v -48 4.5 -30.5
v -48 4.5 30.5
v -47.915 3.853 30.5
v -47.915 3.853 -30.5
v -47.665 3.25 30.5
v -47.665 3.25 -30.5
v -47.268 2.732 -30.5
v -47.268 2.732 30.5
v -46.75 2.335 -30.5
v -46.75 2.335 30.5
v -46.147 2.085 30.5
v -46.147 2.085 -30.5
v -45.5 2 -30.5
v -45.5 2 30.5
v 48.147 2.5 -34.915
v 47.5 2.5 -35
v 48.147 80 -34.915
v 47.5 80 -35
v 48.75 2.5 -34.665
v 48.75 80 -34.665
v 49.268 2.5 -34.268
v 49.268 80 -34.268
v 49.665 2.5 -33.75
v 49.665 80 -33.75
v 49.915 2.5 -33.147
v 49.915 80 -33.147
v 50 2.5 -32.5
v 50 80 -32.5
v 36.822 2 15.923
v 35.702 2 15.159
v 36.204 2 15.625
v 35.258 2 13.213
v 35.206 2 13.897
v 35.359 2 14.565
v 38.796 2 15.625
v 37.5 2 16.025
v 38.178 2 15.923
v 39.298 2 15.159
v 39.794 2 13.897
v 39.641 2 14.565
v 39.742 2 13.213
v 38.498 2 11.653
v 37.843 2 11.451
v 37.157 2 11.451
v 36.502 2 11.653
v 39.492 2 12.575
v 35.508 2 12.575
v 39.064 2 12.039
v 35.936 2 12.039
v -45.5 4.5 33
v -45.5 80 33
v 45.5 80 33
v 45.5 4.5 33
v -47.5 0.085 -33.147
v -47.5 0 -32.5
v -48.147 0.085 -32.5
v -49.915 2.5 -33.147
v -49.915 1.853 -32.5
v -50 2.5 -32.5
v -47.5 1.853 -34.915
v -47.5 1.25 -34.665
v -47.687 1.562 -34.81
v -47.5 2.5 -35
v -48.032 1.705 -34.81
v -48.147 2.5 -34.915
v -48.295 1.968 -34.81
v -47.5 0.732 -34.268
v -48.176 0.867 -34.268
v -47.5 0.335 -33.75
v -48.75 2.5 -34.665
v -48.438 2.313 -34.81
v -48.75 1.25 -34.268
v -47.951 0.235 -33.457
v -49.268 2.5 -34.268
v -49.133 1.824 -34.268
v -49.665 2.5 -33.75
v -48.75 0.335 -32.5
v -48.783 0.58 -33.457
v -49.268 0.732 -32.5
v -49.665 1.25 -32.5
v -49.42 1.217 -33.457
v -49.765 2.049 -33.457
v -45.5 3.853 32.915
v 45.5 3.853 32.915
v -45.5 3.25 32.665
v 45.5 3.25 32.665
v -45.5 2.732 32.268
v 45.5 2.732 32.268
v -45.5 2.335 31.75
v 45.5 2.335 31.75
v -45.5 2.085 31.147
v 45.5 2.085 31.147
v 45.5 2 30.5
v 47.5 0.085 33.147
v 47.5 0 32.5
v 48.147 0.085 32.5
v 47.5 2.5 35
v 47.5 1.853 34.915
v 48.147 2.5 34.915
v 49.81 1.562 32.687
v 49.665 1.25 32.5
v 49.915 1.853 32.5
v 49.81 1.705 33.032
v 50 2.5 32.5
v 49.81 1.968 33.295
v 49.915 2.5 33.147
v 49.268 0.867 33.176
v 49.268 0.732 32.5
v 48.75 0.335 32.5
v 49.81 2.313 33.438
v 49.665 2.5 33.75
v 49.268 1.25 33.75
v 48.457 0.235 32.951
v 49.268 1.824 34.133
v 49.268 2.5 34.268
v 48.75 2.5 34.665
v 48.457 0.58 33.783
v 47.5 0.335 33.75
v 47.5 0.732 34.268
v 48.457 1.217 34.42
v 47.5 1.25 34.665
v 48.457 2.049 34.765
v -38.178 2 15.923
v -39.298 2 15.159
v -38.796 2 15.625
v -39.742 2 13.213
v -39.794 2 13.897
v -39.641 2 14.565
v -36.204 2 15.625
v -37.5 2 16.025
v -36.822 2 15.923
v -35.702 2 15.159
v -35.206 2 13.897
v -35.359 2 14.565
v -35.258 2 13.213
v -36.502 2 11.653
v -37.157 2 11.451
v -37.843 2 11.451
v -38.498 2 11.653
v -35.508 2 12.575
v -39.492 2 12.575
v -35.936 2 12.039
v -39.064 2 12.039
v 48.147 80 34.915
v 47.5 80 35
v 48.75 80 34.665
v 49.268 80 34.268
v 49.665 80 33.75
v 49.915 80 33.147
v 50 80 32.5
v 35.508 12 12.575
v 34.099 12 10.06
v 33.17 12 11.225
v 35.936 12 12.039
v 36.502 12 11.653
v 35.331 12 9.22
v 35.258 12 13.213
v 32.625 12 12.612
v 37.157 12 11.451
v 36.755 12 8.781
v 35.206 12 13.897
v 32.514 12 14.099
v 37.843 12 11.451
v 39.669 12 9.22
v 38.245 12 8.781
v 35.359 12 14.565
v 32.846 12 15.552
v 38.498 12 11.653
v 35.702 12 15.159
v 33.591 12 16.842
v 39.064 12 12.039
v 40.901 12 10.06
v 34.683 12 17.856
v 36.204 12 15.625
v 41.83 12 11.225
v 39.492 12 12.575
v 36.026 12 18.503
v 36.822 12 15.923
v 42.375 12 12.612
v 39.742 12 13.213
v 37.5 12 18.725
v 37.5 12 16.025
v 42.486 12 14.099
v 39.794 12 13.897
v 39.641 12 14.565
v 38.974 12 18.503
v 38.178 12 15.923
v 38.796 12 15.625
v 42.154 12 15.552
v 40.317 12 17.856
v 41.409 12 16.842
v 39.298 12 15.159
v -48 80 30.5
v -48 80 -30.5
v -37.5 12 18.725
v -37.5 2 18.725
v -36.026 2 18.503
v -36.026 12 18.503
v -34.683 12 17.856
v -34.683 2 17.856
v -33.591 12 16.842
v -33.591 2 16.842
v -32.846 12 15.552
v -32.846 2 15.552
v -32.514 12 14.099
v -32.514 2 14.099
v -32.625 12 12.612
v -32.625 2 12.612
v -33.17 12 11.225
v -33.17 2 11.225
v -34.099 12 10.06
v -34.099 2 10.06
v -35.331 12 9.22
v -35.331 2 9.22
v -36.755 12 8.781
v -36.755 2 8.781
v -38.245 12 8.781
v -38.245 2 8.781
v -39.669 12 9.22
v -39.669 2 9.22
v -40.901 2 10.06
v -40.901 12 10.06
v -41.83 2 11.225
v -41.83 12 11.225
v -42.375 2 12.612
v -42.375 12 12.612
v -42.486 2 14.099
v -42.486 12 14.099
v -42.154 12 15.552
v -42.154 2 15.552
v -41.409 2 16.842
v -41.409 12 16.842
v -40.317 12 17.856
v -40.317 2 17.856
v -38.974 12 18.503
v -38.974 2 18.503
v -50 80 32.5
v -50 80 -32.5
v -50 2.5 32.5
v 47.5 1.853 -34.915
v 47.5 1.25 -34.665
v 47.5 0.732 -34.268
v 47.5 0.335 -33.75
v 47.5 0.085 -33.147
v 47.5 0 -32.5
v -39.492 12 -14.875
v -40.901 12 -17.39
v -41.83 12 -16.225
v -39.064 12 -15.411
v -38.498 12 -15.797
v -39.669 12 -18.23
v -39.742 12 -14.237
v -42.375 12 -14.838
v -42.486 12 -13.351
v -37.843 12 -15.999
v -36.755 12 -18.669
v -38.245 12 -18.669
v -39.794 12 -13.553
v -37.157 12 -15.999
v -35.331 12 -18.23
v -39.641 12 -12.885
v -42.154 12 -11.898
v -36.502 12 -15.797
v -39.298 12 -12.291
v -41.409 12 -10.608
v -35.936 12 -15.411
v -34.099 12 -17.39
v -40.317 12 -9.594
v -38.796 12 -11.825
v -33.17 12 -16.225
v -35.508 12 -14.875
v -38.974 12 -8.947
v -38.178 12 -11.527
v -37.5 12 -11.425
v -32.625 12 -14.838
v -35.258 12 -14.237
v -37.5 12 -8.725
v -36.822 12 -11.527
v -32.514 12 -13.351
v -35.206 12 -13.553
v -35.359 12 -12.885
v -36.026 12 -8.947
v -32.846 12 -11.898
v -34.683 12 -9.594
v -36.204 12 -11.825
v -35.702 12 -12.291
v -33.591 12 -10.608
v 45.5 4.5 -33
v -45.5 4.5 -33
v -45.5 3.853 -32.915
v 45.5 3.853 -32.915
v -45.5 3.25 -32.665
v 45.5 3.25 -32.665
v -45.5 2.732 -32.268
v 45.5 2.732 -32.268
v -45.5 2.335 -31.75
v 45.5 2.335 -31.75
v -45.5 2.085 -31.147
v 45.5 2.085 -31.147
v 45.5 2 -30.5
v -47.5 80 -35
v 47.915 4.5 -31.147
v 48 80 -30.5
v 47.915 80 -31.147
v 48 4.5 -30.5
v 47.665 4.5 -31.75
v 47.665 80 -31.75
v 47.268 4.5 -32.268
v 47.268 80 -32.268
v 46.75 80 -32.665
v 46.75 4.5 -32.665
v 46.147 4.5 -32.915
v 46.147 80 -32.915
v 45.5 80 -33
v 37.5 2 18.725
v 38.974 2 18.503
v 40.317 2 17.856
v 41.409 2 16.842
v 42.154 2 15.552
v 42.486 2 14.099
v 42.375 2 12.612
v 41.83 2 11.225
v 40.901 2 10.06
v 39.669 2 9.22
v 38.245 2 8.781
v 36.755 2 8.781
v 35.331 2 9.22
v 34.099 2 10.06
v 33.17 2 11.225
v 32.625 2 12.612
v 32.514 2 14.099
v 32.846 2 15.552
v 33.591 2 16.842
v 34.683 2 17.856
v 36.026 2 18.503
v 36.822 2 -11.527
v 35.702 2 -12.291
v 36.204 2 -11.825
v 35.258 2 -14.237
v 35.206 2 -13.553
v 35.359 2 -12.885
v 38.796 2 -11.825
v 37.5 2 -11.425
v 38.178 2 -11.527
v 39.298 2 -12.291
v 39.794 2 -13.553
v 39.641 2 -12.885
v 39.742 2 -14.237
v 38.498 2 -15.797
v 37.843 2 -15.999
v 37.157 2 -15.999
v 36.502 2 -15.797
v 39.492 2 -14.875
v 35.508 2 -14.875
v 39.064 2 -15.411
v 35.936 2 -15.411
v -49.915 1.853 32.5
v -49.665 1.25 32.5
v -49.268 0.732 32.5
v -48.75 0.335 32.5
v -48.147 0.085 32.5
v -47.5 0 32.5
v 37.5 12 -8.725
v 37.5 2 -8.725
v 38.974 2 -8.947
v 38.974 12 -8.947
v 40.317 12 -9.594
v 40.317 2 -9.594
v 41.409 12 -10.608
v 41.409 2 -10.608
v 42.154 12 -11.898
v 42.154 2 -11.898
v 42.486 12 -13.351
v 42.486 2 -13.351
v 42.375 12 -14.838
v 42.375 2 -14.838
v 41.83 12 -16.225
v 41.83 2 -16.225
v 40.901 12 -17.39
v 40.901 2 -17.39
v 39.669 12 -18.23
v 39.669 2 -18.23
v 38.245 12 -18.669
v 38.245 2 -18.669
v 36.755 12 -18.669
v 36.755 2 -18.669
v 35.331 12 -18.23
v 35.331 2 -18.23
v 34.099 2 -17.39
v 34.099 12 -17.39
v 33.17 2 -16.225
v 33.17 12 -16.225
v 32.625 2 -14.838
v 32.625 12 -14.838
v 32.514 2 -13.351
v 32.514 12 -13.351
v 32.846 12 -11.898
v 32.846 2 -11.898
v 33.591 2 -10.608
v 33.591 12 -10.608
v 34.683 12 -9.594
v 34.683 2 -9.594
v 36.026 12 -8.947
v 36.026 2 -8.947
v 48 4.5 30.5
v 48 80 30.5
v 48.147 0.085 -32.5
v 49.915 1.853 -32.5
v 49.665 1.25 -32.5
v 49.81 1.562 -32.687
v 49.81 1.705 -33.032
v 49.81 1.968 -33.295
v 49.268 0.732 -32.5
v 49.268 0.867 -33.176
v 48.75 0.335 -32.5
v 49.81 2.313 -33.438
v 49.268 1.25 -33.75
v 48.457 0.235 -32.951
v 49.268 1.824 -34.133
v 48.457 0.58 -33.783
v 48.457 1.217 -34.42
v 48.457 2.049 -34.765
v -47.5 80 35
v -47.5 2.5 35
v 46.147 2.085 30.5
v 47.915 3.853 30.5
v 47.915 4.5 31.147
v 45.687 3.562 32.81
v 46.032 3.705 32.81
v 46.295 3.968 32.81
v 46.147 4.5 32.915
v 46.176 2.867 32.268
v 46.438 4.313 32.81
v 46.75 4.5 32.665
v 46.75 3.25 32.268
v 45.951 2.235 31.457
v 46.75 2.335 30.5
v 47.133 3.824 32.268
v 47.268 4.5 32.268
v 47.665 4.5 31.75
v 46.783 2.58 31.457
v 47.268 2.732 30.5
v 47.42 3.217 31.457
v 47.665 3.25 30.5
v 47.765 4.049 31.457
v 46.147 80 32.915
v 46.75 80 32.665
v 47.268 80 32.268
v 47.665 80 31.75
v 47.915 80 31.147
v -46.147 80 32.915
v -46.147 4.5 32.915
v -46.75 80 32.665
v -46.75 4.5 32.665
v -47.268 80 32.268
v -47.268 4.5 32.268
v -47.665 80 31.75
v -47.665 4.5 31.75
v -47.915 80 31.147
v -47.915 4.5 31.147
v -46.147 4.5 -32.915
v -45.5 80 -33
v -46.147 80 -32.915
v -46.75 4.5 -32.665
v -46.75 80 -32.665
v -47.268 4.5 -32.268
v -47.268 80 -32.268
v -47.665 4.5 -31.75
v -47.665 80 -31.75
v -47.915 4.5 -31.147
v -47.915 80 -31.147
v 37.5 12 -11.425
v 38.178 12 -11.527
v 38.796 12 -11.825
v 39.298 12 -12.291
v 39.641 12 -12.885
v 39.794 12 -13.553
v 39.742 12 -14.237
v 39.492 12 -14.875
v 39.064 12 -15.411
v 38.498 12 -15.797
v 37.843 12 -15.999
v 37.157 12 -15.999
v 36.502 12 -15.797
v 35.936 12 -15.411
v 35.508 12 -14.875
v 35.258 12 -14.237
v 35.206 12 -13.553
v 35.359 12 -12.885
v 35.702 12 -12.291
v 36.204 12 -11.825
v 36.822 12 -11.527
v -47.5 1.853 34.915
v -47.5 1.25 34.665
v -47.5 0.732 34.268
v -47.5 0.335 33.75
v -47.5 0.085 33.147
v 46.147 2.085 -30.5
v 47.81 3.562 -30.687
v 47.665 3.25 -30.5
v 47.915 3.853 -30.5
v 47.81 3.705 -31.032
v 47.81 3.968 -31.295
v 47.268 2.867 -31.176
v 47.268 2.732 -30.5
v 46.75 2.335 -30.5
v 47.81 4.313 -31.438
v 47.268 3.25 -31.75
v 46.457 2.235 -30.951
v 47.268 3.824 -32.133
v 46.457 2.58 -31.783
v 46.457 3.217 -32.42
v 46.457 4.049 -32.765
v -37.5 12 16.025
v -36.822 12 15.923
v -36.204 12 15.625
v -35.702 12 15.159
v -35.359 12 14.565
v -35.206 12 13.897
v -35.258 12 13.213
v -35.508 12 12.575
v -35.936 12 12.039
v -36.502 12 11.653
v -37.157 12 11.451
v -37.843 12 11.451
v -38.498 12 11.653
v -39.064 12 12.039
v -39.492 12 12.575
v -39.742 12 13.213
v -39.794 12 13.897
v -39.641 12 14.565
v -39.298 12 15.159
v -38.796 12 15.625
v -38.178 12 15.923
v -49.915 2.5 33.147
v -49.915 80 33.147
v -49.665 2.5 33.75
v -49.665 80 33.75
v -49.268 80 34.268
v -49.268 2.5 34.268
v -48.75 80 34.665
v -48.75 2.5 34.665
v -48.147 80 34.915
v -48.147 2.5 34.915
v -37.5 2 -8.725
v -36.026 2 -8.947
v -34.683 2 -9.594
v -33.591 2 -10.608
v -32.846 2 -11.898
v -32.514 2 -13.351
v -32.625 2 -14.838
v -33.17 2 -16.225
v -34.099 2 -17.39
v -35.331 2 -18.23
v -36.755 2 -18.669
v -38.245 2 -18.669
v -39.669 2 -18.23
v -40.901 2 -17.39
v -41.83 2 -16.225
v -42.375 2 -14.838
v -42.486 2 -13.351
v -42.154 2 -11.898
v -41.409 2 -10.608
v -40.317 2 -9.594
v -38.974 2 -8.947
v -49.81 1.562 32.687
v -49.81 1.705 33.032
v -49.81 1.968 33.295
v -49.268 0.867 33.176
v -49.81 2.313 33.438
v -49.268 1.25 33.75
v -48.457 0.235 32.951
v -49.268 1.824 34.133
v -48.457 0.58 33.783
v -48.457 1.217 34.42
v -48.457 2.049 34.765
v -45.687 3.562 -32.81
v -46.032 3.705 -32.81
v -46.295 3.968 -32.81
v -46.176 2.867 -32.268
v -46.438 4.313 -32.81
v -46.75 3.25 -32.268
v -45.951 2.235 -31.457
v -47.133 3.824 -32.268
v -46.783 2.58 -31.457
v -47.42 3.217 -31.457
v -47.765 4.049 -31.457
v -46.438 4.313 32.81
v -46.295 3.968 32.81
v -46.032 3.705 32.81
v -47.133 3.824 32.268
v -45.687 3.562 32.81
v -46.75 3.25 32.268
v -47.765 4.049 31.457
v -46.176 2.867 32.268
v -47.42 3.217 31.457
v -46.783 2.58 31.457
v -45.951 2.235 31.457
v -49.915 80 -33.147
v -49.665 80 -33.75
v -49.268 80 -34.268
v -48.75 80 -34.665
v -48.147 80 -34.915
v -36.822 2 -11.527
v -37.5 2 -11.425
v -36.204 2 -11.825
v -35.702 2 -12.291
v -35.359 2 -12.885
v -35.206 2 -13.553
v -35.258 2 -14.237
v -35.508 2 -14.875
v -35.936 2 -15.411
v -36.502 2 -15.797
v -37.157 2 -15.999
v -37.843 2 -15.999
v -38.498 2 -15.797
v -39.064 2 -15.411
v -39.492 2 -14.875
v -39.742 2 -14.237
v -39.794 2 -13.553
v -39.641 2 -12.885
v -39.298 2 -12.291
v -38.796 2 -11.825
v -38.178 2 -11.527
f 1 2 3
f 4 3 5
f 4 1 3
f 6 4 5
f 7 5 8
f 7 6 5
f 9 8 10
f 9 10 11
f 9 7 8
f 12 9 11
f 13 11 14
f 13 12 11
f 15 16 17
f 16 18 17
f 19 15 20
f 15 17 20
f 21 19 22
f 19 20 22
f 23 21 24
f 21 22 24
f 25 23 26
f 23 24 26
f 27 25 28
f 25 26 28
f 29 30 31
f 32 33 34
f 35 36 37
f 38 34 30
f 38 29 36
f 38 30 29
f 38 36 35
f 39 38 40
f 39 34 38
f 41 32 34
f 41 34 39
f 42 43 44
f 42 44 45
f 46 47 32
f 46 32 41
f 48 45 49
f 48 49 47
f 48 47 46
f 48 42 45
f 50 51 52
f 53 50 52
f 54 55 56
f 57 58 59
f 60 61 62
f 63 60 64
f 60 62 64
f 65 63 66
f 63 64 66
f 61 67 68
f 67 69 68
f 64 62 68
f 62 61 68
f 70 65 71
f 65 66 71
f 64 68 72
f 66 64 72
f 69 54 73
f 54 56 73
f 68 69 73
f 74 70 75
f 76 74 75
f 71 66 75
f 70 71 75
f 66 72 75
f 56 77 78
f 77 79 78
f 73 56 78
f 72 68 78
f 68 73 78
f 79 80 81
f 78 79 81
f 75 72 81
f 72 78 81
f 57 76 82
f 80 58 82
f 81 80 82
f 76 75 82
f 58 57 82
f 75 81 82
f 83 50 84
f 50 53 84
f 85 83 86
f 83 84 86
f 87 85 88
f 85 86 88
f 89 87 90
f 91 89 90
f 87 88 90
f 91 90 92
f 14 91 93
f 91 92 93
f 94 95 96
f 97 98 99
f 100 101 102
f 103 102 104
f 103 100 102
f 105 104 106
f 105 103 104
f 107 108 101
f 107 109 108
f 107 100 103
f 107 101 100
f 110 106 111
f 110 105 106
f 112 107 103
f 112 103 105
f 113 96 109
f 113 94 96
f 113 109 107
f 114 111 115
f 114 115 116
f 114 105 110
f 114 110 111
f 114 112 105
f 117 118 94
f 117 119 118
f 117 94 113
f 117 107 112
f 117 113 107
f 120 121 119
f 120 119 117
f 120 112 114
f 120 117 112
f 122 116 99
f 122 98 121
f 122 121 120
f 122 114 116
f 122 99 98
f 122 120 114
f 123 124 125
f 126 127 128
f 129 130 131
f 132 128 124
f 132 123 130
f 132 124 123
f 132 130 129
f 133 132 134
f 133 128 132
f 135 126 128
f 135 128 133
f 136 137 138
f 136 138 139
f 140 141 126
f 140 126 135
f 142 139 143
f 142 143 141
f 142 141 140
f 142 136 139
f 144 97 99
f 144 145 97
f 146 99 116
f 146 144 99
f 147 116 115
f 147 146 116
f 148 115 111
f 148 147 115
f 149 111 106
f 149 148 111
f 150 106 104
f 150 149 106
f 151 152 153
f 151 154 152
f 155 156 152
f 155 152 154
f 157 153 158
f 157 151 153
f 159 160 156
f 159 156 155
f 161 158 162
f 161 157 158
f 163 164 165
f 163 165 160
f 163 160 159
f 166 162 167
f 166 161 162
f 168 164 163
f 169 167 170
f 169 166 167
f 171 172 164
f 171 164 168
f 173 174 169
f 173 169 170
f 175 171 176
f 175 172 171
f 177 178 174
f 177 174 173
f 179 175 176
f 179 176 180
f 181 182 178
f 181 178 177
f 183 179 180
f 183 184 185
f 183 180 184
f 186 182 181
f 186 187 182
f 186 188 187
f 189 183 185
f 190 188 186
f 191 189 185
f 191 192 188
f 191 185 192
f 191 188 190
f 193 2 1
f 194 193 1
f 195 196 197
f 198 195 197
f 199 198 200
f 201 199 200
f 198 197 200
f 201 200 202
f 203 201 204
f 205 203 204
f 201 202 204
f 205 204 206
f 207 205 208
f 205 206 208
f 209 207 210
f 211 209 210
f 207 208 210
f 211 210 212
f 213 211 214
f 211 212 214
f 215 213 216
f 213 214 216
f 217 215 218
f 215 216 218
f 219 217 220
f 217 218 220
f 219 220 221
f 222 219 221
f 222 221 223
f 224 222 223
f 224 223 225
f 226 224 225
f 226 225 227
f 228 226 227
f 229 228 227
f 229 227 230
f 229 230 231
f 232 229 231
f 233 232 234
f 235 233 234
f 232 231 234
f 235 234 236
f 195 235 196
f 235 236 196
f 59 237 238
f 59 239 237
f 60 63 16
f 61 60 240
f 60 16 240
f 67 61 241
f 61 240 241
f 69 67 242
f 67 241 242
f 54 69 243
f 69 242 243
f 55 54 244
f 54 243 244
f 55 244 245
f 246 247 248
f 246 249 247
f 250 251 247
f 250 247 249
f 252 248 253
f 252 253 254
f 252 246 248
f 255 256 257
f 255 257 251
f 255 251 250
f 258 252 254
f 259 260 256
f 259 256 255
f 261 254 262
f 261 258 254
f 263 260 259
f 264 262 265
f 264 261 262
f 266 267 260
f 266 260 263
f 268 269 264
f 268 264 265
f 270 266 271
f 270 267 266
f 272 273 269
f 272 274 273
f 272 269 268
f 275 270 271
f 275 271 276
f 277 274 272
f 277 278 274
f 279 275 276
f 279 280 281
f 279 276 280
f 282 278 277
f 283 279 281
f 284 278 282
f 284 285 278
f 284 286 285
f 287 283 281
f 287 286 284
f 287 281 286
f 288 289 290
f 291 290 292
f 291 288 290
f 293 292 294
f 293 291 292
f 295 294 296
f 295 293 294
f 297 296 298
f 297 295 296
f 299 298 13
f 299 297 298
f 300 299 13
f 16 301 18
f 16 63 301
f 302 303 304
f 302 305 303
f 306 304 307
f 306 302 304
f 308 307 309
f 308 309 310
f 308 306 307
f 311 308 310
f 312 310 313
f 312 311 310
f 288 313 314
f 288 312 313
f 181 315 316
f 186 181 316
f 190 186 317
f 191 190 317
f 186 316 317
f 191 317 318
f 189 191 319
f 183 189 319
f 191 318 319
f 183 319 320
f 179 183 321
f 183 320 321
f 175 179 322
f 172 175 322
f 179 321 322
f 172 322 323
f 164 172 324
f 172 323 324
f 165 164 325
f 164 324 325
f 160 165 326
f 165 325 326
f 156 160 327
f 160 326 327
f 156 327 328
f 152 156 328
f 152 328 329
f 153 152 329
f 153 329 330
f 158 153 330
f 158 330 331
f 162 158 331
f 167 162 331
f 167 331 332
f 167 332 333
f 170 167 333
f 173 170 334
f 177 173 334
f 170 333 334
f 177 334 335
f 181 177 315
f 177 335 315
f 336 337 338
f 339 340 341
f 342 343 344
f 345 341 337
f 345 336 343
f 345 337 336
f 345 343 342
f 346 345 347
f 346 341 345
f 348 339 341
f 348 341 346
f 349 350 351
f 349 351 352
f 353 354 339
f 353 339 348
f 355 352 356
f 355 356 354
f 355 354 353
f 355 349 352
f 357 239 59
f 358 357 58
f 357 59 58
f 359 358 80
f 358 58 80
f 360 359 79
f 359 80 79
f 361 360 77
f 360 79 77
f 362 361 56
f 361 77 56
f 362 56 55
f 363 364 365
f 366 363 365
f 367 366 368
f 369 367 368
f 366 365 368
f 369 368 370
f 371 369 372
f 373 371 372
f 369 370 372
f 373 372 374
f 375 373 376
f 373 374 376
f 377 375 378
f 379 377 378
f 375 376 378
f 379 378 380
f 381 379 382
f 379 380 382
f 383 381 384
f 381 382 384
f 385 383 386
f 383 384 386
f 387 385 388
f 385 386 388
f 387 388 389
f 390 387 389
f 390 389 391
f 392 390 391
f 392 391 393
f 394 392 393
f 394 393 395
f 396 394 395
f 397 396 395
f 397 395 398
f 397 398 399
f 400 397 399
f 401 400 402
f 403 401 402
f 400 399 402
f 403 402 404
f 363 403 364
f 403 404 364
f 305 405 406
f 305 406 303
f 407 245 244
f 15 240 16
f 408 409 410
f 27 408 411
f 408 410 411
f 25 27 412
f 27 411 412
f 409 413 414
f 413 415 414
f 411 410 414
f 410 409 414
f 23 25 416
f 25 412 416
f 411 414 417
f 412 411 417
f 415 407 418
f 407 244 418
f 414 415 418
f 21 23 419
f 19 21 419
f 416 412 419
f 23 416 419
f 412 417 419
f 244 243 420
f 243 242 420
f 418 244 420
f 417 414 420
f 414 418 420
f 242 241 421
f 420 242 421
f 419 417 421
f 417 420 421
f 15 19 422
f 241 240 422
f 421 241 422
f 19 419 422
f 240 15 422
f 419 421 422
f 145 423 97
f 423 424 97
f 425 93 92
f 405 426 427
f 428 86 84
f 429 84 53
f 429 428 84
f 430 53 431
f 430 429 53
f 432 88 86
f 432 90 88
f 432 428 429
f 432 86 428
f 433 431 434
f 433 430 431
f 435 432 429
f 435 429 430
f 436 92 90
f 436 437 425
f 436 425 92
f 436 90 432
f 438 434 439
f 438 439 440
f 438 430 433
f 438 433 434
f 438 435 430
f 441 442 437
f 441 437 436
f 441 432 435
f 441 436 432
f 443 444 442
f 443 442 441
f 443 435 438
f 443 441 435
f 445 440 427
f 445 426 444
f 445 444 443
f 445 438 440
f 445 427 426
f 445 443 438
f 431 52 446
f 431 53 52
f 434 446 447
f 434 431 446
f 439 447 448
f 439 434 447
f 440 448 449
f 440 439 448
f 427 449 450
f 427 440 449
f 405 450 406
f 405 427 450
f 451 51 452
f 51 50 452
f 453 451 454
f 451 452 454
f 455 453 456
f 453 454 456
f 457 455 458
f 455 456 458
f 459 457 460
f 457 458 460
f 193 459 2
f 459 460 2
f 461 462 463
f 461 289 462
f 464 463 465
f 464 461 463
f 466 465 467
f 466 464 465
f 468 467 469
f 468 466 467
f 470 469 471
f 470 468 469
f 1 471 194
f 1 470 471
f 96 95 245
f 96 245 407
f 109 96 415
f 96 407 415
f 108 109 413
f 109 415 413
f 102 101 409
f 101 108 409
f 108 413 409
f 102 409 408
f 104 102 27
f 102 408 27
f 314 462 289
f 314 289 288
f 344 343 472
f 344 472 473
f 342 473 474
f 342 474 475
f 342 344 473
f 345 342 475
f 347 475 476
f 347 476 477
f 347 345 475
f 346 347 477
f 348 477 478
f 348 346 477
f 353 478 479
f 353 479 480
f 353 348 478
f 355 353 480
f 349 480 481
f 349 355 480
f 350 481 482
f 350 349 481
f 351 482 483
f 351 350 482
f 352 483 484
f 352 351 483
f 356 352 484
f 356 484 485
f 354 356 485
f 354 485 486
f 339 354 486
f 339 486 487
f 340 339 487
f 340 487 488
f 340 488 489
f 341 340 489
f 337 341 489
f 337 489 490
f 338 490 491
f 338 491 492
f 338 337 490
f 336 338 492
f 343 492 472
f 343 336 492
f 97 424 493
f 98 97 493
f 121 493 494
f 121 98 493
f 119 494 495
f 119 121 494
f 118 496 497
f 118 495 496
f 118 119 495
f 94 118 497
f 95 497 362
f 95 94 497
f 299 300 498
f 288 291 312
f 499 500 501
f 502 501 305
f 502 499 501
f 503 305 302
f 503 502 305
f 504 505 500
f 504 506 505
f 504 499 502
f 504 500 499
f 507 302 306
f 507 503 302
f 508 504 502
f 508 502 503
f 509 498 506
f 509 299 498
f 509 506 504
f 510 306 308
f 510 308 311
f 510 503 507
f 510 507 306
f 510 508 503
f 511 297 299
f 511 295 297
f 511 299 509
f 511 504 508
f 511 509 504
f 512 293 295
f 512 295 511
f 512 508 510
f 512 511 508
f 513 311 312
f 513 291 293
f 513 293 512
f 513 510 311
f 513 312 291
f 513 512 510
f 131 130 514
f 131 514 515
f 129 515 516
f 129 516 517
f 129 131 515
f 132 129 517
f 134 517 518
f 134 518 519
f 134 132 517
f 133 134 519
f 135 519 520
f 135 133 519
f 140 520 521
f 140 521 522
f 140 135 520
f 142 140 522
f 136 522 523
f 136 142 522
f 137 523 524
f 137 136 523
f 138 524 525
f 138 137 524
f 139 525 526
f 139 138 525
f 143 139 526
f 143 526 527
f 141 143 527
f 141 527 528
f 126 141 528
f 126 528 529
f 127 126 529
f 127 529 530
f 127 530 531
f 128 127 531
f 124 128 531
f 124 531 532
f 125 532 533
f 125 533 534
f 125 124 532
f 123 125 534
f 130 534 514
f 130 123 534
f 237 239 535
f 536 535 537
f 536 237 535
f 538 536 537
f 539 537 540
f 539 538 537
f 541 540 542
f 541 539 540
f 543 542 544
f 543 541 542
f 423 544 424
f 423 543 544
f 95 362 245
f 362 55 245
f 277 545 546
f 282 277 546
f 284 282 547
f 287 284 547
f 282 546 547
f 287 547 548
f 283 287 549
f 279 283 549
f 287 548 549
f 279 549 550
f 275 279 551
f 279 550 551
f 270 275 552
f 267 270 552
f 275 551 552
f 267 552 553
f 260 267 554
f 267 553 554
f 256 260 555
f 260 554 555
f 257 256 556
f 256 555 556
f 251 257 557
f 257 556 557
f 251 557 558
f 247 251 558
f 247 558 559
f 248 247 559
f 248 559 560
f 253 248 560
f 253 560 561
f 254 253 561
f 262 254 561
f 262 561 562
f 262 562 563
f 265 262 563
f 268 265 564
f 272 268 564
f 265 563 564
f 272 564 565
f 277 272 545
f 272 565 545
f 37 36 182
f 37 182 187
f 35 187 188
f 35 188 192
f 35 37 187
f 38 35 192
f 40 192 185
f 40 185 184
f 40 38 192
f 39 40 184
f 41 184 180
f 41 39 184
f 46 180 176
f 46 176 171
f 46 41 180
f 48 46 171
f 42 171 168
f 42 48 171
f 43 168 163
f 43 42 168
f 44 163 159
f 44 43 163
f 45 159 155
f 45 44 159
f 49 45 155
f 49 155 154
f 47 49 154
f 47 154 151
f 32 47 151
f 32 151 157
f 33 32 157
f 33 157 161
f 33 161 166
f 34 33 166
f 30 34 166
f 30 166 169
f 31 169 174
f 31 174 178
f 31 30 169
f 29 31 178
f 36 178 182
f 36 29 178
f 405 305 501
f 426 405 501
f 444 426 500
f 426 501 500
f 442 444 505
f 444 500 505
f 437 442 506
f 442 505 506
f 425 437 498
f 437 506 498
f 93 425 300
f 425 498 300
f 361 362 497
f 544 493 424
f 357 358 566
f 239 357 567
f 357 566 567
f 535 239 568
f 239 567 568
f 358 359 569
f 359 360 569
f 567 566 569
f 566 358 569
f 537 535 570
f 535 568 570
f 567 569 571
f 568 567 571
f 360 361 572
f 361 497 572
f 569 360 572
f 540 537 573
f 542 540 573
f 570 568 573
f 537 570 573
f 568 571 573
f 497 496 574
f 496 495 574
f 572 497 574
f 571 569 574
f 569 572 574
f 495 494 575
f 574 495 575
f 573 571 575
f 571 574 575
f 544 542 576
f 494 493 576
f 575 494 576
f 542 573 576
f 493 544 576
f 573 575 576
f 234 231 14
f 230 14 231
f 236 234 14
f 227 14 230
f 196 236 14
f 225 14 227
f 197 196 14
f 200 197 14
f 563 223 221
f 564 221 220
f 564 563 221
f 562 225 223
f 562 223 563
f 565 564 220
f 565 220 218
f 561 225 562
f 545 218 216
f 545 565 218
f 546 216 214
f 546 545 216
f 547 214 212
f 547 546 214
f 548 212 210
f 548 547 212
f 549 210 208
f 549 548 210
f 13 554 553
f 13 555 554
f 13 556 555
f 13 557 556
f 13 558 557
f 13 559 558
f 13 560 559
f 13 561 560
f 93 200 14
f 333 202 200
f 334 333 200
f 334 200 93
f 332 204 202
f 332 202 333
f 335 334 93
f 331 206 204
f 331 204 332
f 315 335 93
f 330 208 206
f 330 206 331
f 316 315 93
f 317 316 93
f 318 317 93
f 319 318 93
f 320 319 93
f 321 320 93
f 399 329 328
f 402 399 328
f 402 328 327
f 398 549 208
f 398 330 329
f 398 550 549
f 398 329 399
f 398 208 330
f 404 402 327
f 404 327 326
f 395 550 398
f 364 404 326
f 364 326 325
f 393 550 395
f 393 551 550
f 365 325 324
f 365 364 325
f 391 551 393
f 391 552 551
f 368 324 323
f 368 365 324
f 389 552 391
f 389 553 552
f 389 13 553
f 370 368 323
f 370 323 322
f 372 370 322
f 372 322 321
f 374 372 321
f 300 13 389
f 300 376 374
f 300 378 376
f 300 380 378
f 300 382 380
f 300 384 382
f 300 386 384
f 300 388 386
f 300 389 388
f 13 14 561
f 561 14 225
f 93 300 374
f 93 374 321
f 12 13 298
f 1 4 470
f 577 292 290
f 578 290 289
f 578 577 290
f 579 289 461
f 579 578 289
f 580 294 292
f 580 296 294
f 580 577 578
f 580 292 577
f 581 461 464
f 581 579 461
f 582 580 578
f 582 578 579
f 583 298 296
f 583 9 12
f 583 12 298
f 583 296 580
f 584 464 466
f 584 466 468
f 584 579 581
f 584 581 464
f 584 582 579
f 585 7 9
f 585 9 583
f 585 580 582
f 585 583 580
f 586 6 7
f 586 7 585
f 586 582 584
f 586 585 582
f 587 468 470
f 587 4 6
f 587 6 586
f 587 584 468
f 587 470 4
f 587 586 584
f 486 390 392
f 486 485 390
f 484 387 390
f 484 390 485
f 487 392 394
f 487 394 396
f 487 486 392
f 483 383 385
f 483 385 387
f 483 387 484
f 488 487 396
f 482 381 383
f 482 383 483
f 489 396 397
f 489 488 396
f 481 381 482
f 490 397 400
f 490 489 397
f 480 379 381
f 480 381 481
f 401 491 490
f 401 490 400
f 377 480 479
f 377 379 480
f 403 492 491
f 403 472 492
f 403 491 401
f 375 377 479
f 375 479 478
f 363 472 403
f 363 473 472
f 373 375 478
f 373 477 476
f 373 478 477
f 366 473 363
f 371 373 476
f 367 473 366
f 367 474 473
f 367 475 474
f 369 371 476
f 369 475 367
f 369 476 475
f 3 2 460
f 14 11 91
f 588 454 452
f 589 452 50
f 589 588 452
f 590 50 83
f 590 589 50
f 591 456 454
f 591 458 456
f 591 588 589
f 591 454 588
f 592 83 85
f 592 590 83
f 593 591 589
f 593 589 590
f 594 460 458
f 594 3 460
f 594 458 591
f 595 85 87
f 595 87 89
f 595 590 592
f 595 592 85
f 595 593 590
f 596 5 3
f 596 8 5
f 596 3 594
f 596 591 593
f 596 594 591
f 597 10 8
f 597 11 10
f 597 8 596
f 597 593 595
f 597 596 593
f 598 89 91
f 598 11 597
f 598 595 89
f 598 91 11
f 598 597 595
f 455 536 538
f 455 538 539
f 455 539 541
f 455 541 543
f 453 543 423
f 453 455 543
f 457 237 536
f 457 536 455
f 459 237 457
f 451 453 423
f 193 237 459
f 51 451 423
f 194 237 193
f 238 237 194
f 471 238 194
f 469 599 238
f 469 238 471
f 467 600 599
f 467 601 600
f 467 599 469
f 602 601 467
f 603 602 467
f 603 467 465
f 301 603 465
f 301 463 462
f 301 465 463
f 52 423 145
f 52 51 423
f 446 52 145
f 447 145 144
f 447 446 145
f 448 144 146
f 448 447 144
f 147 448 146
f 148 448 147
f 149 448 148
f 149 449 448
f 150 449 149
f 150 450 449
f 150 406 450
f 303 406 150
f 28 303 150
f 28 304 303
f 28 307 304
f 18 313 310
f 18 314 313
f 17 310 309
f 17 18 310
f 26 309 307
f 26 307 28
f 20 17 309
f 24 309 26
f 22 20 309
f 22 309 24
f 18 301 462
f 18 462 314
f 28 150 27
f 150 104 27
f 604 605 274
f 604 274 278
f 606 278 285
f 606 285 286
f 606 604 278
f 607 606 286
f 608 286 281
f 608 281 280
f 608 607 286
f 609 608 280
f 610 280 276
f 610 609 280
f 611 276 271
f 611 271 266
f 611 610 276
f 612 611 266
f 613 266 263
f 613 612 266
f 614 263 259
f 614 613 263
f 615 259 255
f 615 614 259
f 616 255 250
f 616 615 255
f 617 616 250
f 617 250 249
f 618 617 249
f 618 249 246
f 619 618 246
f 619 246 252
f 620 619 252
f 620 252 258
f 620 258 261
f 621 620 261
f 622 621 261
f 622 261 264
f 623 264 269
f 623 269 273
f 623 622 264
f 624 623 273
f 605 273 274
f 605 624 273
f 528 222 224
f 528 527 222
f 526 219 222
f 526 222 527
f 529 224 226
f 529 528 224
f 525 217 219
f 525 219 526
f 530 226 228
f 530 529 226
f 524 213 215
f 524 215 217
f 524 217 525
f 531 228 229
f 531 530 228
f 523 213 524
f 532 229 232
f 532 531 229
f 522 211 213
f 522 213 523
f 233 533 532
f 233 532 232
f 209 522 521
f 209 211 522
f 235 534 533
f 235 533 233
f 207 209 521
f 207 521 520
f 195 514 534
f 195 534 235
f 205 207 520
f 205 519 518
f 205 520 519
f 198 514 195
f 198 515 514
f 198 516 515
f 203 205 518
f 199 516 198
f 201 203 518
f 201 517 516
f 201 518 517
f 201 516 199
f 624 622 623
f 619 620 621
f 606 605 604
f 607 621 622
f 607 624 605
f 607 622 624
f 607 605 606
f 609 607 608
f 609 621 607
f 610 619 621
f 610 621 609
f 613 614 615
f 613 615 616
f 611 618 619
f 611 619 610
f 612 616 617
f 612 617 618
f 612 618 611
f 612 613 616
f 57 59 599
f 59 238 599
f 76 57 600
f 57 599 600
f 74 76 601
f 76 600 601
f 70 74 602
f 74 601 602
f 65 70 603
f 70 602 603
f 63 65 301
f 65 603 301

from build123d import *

# Parameters (mm, degrees)
SKETCH_2_W          = 100
SKETCH_2_H          = 70
EXTRUDE_1_DEPTH     = 80
SKETCH_4_W          = 96
SKETCH_4_H          = 66
CUT_EXTRUDE_1_DEPTH = 78
FILLET_2_R          = 2.5
SKETCH_6_R          = 5
SKETCH_6_R_2        = 2.3
EXTRUDE_3_DEPTH     = 10


with BuildPart() as part:
    # Эскиз2 → Бобышка-Вытянуть1 (new body)
    with BuildSketch(Plane(origin=(0, 0, 0), x_dir=(1, 0, 0), z_dir=(0, 1, 0))):
        Rectangle(SKETCH_2_W, SKETCH_2_H)
    extrude(amount=EXTRUDE_1_DEPTH)

    # Эскиз4 → Вырез-Вытянуть1 (cut)
    with BuildSketch(Plane(origin=(0, 80, 0), x_dir=(1, 0, 0), z_dir=(0, 1, 0))):
        Rectangle(SKETCH_4_W, SKETCH_4_H)
    extrude(amount=-CUT_EXTRUDE_1_DEPTH, mode=Mode.SUBTRACT)

    # Скругление2
    fillet_2_edges = [part.edges().sort_by_distance(p)[0] for p in [
        (-48, 2, 0),
        (-48, 41, 33),
        (0, 2, -33),
        (-48, 41, -33),
        (48, 2, 0),
        (48, 41, -33),
        (0, 2, 33),
        (48, 41, 33),
        (0, 0, 35),
        (-50, 0, 0),
        (0, 0, -35),
        (50, 0, 0),
        (50, 40, 35),
        (-50, 40, 35),
        (-50, 40, -35),
        (50, 40, -35),
    ]]
    fillet(fillet_2_edges, radius=FILLET_2_R)

    # Эскиз6 → Бобышка-Вытянуть3 (add)
    # profile 1 of 4: a face of its own
    with BuildSketch(Plane(origin=(0, 2, 0), x_dir=(1, 0, 0), z_dir=(0, 1, 0))):
        with Locations(Location((-37.5, 13.725, 0), (0, 0, 270))):
            Circle(SKETCH_6_R)
        with Locations(Location((-37.5, 13.725, 0), (0, 0, 270))):
            Circle(SKETCH_6_R_2, mode=Mode.SUBTRACT)
    # profile 2 of 4: a face of its own
    with BuildSketch(Plane(origin=(0, 2, 0), x_dir=(1, 0, 0), z_dir=(0, 1, 0))):
        with Locations(Location((37.5, 13.725, 0), (0, 0, 270))):
            Circle(SKETCH_6_R)
        with Locations(Location((37.5, 13.725, 0), (0, 0, 270))):
            Circle(SKETCH_6_R_2, mode=Mode.SUBTRACT)
    # profile 3 of 4: a face of its own
    with BuildSketch(Plane(origin=(0, 2, 0), x_dir=(1, 0, 0), z_dir=(0, 1, 0))):
        with Locations(Location((-37.5, -13.725, 0), (0, 0, 270))):
            Circle(SKETCH_6_R)
        with Locations(Location((-37.5, -13.725, 0), (0, 0, 270))):
            Circle(SKETCH_6_R_2, mode=Mode.SUBTRACT)
    # profile 4 of 4: a face of its own
    with BuildSketch(Plane(origin=(0, 2, 0), x_dir=(1, 0, 0), z_dir=(0, 1, 0))):
        with Locations(Location((37.5, -13.725, 0), (0, 0, 270))):
            Circle(SKETCH_6_R)
        with Locations(Location((37.5, -13.725, 0), (0, 0, 270))):
            Circle(SKETCH_6_R_2, mode=Mode.SUBTRACT)
    extrude(amount=EXTRUDE_3_DEPTH)


solid = part.part
